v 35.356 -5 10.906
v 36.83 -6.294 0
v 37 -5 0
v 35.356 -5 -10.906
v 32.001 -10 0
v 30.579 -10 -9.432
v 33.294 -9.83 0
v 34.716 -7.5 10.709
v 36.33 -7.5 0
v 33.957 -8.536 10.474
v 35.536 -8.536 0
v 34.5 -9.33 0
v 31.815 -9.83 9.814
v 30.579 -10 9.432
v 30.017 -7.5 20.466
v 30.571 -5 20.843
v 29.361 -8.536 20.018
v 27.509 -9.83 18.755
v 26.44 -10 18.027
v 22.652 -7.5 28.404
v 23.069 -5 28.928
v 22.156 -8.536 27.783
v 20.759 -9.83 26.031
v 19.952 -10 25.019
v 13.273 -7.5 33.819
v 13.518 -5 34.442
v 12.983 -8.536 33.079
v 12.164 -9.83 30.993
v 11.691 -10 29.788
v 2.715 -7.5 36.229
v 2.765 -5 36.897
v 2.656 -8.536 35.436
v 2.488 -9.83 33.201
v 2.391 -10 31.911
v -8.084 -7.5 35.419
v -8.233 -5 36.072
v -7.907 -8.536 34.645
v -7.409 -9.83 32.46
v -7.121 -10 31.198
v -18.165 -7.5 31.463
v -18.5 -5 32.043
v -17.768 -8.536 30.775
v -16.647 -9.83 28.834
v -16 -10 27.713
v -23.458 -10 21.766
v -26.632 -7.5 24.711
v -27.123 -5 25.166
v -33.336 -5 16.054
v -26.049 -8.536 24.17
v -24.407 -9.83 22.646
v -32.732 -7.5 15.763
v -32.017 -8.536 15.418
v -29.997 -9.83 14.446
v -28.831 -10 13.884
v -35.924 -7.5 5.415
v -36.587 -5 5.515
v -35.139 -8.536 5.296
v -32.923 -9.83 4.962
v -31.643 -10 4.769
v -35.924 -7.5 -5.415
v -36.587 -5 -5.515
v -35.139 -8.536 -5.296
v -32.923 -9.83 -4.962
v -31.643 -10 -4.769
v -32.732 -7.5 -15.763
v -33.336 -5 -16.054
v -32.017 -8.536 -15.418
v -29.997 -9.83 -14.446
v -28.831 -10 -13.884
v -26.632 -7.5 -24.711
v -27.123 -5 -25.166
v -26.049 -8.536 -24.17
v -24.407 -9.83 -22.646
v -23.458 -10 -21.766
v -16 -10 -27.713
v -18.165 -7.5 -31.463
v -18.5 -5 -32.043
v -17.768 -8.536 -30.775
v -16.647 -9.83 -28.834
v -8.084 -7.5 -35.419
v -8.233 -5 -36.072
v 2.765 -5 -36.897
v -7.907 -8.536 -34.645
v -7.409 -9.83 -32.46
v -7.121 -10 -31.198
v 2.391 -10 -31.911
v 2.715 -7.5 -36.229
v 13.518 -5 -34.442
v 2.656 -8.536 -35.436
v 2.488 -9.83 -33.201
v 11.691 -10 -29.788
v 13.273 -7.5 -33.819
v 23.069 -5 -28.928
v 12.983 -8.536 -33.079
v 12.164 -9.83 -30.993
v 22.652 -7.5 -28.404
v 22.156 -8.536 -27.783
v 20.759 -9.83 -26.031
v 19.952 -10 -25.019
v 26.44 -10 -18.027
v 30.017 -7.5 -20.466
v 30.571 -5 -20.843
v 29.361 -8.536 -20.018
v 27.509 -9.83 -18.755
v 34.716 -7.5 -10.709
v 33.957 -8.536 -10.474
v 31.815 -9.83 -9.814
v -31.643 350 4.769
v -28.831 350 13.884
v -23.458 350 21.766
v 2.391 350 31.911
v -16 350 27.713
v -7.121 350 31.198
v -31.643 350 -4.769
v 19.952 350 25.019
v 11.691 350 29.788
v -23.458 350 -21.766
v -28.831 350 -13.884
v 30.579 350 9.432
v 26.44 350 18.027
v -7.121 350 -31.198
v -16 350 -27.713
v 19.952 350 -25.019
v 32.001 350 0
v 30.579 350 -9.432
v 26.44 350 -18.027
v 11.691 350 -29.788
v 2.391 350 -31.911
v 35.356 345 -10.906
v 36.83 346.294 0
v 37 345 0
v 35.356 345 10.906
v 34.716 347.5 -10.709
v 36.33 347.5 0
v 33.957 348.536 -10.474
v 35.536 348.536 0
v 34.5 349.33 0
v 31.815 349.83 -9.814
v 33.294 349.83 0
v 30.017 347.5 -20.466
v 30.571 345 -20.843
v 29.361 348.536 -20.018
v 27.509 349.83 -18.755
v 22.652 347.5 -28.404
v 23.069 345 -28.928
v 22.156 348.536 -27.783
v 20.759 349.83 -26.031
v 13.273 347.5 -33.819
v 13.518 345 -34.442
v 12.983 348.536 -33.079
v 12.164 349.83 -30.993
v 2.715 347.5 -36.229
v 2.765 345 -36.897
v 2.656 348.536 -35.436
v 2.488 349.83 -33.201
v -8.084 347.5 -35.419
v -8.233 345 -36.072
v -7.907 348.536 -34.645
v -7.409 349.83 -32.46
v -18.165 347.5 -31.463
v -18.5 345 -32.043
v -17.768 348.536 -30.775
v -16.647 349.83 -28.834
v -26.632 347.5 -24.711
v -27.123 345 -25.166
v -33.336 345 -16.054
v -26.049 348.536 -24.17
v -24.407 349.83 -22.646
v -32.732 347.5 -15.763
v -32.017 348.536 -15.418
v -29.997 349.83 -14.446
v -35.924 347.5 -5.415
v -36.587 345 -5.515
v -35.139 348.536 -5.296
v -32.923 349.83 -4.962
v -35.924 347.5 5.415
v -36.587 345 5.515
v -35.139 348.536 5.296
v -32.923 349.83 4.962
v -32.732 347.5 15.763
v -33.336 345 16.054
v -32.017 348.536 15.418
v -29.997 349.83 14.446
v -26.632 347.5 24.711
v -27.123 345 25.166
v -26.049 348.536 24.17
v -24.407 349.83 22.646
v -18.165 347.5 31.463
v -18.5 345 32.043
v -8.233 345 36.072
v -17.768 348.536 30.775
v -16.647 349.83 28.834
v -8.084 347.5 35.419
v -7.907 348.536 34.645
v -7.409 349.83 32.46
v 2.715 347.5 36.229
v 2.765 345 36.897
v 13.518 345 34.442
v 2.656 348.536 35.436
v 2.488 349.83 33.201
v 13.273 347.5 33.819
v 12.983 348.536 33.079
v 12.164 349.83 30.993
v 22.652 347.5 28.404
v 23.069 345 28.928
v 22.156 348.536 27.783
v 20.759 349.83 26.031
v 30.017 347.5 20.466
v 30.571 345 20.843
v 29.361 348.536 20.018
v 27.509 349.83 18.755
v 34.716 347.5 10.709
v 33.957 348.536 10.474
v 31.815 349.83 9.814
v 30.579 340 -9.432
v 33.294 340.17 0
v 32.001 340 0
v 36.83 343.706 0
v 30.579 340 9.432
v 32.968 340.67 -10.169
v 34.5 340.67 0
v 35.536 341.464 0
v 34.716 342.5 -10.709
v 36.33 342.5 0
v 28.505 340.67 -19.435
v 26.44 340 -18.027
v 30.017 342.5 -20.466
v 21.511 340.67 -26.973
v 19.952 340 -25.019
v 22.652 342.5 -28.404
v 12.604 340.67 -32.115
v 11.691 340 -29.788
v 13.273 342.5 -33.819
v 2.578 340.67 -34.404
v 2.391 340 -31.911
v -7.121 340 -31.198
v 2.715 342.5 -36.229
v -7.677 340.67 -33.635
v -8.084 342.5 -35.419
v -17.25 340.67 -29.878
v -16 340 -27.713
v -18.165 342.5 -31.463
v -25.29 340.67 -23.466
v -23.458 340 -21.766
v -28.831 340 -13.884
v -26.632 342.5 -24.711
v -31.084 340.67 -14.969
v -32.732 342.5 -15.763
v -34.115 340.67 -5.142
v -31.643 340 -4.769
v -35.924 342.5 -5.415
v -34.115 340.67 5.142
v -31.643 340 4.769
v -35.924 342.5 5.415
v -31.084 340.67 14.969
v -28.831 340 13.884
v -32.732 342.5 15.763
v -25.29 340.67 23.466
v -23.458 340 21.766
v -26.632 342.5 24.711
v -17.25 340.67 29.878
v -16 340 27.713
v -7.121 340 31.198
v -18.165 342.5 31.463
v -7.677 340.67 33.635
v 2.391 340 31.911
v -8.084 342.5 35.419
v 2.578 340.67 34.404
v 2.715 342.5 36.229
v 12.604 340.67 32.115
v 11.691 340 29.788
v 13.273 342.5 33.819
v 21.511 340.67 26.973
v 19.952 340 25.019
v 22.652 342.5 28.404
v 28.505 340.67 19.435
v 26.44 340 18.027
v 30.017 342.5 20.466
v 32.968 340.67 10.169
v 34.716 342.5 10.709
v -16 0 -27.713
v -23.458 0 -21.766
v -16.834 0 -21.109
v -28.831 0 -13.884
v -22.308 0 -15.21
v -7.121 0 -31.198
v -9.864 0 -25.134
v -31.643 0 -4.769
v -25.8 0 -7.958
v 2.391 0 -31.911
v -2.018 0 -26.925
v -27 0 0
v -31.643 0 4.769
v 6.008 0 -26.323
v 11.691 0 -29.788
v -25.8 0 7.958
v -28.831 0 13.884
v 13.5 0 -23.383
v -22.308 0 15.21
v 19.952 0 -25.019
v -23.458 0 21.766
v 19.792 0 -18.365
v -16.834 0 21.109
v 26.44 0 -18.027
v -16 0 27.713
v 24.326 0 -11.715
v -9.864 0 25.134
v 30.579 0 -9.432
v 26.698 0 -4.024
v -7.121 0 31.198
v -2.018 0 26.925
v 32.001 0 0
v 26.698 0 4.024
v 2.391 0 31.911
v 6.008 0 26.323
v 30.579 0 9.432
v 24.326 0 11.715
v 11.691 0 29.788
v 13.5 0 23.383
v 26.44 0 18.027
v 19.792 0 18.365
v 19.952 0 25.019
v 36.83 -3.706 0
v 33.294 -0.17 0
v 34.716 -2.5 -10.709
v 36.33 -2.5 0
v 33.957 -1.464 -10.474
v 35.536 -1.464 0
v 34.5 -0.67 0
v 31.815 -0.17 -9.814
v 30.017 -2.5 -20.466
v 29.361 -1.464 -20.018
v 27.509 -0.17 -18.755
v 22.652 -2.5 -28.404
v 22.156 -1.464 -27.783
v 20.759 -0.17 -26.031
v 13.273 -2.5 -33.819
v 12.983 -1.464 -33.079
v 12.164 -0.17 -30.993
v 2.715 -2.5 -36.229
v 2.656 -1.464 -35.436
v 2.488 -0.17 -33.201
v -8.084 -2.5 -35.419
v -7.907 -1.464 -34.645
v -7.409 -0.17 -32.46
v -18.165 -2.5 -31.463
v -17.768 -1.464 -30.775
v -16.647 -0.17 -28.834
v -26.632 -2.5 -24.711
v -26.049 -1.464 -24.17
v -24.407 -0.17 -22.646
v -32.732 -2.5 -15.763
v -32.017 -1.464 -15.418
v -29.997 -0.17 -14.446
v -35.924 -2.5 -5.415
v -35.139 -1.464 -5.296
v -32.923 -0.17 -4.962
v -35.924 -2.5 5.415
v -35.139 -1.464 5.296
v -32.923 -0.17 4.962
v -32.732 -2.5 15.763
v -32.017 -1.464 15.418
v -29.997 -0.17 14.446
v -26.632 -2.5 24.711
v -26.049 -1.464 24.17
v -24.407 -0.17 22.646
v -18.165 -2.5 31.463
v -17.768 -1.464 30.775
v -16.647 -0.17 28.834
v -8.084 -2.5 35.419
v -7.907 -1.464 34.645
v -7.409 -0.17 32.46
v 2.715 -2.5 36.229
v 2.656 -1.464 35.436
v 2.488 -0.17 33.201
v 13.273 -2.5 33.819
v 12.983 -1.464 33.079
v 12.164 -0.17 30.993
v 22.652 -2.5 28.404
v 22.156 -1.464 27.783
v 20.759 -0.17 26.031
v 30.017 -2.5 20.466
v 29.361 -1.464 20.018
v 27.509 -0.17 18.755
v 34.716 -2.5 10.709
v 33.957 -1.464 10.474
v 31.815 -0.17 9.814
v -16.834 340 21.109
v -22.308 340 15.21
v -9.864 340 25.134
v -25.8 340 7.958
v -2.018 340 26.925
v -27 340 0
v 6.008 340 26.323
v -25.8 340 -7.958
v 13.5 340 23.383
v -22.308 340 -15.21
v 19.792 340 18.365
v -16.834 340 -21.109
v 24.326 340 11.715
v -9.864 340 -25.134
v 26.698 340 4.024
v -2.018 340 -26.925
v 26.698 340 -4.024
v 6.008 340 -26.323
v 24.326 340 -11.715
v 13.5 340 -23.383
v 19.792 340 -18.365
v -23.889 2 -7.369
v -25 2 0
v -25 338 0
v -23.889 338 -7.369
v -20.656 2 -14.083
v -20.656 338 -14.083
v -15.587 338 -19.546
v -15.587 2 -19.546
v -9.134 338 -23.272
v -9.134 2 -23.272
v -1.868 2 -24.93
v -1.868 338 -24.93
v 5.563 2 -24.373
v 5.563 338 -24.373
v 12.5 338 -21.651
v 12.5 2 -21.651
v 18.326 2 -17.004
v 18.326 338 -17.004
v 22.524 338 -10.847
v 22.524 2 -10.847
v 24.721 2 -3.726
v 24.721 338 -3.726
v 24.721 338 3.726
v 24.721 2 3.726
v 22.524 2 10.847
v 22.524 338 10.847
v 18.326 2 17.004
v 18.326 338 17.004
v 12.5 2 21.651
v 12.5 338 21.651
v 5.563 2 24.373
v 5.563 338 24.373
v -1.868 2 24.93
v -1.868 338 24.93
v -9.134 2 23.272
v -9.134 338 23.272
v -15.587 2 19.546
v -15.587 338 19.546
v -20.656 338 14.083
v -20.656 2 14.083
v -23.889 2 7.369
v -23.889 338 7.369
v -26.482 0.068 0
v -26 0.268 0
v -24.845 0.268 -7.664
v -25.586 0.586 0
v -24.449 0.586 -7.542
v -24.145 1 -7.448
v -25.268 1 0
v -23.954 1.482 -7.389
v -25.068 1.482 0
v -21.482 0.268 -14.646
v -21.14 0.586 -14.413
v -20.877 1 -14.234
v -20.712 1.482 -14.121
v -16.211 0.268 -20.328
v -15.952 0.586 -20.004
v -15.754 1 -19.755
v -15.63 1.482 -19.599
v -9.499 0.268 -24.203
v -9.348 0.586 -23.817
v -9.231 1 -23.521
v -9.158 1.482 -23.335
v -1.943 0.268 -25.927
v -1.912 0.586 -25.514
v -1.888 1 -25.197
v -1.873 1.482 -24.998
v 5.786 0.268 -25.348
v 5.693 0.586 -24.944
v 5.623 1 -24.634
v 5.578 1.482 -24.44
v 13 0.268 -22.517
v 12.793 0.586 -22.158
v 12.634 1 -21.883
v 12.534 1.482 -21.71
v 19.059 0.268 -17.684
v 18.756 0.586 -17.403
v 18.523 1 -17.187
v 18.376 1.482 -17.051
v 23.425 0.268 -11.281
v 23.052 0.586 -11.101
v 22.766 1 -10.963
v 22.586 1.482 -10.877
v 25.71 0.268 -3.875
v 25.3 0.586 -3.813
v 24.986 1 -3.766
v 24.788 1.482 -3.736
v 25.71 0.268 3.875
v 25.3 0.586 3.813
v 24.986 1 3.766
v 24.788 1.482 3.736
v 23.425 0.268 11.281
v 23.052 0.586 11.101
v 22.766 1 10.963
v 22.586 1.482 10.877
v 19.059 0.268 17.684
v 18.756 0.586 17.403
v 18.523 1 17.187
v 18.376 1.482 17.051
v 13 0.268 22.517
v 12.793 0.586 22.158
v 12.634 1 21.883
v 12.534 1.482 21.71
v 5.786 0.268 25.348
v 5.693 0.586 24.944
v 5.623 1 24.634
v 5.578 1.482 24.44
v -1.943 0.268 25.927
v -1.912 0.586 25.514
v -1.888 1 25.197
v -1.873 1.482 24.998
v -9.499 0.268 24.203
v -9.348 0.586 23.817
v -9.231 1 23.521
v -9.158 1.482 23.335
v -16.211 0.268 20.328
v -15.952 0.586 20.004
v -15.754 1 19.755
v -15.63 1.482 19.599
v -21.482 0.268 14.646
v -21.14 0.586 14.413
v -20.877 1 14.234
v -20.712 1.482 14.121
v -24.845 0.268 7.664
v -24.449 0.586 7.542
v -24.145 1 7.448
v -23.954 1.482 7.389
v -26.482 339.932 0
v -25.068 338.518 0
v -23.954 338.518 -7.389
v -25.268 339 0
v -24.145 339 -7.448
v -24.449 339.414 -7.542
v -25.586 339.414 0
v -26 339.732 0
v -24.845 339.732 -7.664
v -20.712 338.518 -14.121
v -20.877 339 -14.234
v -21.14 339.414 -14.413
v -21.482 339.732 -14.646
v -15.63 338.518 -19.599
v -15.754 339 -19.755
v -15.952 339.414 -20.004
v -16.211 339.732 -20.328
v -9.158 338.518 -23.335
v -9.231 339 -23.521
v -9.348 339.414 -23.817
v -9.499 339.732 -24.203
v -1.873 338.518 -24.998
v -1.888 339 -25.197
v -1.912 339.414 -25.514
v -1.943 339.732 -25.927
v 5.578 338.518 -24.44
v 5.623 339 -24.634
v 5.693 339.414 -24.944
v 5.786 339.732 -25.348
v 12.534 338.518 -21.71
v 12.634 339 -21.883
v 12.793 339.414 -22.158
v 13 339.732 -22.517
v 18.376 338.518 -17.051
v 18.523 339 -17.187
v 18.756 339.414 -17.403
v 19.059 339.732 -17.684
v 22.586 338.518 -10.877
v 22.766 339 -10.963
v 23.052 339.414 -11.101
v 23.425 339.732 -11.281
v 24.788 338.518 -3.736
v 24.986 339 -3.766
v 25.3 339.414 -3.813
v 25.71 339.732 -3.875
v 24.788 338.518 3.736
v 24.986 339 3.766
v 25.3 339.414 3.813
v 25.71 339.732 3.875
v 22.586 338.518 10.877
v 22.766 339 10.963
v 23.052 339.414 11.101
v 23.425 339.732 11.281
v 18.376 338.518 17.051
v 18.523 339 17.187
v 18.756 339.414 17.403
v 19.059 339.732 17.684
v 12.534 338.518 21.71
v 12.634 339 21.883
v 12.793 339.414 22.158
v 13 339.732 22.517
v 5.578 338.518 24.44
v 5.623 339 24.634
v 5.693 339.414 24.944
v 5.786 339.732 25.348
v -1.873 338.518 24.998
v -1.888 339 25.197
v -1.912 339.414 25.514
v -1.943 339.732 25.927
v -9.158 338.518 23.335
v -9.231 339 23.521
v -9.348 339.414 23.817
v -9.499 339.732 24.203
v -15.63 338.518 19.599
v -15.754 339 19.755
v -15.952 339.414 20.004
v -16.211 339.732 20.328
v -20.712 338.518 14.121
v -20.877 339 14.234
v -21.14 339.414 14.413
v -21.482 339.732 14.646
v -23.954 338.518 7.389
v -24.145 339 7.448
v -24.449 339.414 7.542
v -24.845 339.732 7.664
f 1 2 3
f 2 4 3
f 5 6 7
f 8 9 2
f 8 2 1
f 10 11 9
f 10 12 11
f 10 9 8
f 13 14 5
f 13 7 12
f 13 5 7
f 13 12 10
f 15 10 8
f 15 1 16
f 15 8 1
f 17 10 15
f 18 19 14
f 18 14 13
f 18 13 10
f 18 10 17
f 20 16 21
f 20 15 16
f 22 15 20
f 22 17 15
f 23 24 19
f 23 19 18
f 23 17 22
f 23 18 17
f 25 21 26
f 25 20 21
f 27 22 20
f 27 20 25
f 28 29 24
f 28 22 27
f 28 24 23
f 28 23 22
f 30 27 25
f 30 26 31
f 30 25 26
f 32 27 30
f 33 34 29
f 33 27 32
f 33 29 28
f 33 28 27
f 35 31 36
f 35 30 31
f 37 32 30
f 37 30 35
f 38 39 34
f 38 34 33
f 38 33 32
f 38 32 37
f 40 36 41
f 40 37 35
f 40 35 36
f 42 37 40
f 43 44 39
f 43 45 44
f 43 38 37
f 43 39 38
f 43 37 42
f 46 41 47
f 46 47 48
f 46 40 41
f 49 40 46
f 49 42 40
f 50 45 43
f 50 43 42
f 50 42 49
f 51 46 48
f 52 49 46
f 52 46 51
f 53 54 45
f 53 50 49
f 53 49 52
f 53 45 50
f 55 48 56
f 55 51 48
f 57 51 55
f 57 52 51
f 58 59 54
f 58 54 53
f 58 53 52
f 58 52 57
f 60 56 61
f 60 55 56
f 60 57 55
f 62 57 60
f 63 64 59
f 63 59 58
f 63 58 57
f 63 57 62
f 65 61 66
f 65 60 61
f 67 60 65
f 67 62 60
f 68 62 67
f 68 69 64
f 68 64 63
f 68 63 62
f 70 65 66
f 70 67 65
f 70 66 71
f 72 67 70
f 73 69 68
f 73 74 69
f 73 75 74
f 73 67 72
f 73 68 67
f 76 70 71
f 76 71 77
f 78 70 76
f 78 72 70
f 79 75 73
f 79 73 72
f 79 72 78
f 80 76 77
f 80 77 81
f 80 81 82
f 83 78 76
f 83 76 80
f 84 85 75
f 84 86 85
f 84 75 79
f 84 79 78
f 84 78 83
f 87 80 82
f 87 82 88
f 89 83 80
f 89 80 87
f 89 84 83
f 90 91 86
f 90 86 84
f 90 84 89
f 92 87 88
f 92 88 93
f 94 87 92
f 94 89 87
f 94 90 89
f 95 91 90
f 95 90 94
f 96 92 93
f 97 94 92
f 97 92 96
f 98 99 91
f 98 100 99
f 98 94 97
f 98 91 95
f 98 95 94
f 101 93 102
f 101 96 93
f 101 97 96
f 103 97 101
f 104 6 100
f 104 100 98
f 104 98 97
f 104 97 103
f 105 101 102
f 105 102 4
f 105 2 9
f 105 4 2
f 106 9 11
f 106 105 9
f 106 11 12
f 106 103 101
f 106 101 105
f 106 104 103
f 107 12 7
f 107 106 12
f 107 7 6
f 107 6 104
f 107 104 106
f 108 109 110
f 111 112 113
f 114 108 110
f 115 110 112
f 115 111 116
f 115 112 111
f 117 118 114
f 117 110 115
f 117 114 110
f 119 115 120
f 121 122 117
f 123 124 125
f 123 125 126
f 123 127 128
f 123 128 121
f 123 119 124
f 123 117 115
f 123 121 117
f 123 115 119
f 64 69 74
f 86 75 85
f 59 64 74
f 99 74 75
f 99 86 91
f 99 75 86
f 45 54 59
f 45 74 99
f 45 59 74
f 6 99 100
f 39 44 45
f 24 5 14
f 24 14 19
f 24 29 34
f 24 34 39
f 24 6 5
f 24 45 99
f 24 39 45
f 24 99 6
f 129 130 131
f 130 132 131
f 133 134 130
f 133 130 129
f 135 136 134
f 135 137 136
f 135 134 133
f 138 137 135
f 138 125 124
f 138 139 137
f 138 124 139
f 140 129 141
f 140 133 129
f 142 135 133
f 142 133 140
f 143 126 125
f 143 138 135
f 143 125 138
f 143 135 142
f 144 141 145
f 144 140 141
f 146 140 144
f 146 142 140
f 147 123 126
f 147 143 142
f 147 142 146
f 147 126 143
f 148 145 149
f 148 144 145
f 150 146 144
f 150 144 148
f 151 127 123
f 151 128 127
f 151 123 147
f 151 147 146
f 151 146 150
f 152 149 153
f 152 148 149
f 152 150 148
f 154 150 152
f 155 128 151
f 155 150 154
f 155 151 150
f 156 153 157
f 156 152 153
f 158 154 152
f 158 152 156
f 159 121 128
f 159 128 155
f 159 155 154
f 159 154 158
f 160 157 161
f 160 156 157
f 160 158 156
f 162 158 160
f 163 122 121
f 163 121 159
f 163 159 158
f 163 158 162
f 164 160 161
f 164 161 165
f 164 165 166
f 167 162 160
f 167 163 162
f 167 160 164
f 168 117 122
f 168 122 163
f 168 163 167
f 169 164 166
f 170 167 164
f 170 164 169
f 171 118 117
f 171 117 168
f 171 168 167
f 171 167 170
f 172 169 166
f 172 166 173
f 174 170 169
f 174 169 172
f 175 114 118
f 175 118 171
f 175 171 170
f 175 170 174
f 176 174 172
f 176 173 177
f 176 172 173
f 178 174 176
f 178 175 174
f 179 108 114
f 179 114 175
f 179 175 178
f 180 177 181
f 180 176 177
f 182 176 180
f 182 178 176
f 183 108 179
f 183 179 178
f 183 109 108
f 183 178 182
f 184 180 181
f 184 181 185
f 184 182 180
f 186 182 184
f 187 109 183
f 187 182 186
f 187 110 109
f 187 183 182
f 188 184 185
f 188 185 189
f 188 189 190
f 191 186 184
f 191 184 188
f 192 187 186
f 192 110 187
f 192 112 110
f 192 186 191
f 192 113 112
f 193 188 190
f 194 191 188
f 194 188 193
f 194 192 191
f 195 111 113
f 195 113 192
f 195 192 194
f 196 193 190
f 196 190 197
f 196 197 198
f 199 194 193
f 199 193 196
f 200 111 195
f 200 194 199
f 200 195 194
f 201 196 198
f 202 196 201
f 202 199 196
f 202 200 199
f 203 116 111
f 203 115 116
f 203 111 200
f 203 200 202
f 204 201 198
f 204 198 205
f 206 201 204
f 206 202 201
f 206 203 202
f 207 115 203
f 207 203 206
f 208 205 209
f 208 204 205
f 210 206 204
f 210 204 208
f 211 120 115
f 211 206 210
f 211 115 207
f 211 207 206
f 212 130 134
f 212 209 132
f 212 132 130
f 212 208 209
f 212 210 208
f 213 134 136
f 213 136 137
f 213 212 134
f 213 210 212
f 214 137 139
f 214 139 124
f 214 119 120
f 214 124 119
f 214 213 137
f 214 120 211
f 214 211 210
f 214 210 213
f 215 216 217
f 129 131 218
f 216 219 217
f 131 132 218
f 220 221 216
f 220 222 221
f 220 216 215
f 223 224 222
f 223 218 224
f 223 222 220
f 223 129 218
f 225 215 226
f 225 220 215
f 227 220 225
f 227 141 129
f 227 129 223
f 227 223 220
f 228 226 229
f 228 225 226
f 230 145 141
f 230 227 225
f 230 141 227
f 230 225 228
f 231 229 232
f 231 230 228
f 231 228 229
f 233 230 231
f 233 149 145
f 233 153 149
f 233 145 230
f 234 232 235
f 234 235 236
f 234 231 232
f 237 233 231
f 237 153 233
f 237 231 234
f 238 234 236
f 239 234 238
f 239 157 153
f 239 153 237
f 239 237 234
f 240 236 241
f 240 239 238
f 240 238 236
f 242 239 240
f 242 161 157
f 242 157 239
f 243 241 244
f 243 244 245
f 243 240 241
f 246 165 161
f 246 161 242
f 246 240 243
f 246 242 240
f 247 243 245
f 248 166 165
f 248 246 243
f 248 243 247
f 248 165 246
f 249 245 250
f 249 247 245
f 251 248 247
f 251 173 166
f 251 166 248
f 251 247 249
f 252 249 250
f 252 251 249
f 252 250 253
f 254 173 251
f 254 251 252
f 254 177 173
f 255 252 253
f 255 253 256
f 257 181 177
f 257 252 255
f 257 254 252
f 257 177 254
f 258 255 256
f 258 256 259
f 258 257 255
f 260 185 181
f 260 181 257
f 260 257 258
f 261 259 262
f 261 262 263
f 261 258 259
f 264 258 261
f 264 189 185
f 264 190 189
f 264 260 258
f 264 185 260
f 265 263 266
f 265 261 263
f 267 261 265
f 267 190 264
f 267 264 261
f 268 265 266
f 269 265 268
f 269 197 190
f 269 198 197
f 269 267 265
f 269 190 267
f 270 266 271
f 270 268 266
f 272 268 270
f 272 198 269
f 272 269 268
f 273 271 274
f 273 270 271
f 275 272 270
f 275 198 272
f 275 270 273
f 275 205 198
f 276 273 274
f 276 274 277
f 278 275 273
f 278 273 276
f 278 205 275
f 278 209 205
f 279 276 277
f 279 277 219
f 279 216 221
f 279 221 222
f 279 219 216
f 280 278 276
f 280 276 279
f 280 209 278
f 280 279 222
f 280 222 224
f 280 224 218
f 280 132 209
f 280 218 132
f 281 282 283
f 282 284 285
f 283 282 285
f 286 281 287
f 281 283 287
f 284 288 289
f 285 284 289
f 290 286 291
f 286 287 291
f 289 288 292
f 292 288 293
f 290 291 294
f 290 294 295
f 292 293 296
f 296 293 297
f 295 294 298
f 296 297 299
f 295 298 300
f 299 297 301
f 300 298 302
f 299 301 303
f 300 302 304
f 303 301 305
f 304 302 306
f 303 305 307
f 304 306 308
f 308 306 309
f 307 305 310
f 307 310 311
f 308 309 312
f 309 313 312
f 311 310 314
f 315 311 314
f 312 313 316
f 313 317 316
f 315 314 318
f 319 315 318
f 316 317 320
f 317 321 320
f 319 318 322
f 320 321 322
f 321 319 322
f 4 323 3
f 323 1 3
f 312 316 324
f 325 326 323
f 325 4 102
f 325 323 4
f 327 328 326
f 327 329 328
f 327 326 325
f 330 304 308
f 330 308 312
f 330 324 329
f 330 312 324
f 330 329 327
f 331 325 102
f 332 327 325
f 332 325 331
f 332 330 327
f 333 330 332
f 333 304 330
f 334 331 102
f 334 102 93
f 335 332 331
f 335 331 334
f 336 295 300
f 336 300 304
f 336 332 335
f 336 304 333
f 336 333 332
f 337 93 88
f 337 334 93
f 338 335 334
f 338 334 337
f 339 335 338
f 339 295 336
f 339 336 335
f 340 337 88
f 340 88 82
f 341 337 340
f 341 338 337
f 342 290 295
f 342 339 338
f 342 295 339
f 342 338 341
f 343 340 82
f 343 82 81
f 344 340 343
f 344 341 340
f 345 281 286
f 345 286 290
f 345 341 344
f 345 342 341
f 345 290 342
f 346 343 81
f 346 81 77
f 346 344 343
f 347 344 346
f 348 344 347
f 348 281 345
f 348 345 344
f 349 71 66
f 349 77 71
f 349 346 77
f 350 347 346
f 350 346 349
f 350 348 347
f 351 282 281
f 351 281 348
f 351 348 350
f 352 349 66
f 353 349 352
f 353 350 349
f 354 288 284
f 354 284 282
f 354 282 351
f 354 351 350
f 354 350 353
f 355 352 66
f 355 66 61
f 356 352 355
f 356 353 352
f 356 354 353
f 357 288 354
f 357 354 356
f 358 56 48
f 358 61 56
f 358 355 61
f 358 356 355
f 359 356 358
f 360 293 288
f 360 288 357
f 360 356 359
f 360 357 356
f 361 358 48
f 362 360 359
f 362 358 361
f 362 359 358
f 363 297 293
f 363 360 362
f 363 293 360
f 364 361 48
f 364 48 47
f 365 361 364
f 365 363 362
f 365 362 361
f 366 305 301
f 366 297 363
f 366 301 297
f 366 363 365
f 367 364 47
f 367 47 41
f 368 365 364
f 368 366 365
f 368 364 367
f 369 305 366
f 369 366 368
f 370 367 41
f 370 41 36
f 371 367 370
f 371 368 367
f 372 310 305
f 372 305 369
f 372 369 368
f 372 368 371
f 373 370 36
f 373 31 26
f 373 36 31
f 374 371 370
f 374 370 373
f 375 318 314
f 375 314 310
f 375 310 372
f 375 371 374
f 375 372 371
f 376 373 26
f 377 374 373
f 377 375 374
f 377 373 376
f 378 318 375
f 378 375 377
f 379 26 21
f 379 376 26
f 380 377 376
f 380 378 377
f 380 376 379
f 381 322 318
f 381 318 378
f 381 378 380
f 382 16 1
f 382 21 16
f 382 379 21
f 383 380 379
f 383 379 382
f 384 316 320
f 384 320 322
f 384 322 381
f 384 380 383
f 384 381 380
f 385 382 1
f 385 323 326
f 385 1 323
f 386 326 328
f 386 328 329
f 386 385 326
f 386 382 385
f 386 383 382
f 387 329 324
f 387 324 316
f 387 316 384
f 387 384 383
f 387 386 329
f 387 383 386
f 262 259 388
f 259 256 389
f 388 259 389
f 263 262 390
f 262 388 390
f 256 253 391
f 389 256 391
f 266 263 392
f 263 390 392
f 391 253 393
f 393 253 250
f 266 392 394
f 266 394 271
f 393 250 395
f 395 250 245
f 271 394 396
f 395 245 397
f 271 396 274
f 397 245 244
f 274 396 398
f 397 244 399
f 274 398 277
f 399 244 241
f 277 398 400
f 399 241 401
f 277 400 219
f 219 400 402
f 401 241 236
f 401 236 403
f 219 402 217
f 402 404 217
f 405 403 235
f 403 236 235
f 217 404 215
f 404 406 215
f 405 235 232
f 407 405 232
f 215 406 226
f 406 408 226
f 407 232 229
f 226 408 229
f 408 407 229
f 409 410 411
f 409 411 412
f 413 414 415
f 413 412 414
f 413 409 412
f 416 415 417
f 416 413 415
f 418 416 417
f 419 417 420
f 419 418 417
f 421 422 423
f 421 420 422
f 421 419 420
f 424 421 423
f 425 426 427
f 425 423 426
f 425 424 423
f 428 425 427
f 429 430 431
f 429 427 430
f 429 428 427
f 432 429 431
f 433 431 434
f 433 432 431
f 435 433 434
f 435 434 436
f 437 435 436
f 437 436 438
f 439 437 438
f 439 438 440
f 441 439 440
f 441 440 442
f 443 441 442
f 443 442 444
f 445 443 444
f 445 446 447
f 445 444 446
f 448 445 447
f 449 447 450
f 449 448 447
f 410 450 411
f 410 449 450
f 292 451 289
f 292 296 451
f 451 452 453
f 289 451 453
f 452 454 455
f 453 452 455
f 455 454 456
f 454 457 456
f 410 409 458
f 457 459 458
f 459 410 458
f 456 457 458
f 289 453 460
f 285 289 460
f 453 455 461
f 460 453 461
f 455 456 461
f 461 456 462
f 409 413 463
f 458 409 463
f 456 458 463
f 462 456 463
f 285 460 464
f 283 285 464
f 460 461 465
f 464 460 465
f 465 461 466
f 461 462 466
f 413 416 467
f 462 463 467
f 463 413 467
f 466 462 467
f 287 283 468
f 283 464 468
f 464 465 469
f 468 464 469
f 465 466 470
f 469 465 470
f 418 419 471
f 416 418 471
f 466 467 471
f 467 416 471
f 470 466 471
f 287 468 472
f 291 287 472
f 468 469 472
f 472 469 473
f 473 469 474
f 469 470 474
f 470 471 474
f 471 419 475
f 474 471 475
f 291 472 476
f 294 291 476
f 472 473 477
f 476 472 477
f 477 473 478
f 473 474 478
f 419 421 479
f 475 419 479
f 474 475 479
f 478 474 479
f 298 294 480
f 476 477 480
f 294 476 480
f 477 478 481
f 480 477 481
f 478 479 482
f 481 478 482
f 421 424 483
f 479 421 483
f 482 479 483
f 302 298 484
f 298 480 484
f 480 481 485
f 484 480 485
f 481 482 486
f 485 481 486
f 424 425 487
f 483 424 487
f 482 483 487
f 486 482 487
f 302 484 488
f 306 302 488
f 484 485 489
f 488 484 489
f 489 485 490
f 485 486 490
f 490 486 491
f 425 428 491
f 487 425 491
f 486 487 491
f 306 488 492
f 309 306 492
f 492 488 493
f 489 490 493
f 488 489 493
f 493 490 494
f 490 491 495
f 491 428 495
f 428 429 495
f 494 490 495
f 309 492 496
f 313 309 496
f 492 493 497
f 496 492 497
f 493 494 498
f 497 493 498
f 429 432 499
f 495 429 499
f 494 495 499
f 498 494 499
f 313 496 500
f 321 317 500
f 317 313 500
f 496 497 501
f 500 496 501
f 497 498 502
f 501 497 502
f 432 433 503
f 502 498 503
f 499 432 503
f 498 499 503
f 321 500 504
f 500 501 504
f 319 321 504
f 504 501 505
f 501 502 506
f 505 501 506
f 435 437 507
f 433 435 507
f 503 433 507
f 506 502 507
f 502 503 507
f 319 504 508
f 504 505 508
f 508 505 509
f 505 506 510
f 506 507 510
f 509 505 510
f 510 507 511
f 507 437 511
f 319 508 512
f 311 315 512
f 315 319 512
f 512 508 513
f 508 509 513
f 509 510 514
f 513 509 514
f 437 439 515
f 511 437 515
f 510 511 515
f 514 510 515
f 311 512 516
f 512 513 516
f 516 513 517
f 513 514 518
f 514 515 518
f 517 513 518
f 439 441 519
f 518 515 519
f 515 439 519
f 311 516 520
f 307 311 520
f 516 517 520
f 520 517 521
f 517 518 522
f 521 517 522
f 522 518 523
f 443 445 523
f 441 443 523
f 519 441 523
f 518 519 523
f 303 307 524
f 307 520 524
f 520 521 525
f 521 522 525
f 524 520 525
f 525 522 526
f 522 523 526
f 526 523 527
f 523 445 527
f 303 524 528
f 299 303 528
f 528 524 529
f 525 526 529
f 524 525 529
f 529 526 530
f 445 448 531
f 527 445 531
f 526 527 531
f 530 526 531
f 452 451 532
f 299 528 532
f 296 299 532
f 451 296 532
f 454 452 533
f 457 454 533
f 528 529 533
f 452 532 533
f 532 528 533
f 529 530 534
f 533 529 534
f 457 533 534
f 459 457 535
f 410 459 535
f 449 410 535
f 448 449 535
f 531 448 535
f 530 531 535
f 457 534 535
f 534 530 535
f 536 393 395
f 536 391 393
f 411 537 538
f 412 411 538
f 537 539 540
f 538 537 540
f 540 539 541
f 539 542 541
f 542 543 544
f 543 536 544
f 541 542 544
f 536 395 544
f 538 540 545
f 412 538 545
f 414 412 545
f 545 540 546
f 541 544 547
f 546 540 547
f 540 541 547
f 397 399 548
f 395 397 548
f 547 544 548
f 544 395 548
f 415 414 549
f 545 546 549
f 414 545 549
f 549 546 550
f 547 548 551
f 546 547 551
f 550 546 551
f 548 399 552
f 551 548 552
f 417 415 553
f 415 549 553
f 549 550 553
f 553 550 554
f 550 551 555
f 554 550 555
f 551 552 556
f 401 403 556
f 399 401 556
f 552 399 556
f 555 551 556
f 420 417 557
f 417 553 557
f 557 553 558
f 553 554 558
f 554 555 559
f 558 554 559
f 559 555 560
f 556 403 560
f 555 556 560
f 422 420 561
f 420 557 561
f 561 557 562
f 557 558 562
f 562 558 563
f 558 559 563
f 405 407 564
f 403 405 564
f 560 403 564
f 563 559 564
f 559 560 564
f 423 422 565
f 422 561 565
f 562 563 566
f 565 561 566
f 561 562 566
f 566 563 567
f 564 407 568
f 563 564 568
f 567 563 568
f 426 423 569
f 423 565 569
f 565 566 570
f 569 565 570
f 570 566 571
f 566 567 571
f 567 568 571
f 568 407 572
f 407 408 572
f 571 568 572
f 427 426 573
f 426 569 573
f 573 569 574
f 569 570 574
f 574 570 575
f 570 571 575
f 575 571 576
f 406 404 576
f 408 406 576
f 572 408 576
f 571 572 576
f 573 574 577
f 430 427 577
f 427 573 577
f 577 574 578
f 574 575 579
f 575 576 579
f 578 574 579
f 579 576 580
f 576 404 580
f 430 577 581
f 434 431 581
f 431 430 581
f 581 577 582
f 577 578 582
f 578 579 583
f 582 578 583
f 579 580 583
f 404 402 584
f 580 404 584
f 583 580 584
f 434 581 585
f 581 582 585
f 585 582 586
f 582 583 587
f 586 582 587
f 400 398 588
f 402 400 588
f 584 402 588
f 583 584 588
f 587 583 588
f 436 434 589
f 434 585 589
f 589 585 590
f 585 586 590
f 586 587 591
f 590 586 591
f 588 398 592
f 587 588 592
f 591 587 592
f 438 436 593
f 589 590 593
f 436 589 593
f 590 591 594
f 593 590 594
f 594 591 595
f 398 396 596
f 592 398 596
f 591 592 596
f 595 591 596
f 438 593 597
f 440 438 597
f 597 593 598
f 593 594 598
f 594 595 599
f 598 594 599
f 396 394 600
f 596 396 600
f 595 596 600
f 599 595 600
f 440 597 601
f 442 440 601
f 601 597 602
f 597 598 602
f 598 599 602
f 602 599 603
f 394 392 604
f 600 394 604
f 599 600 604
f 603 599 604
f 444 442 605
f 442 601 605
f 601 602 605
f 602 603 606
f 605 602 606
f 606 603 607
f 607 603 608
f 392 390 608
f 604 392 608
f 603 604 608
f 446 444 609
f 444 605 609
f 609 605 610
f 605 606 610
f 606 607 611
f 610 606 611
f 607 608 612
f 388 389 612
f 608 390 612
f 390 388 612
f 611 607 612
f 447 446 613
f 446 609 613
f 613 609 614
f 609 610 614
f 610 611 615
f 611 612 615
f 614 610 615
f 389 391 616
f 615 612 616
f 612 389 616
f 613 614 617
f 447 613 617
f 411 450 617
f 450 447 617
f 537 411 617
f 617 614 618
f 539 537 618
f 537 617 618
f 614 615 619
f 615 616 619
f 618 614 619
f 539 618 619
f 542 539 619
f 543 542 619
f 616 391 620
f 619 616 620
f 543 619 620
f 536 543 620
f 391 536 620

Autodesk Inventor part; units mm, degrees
ref_plane "YZ Plane" through (0, 0, 0) normal (1, 0, 0) x (0, 1, 0)
ref_plane "XZ Plane" through (0, 0, 0) normal (0, 1, 0) x (-1, 0, 0)
ref_plane "XY Plane" through (0, 0, 0) normal (0, 0, 1) x (1, 0, 0)
sketch "草图1" plane through (0, 0, 0) normal (0, 1, 0) x (-1, 0, 0)
  circle A0 centre (0, 0) radius 25
  dimension "d0" = 50
extrude "拉伸1" add sketch "草图1" along normal blind 340
sketch "草图2" plane through (0, 340, 0) normal (0, 1, 0) x (1, 0, 0)
  circle A0 centre (0, 0) radius 37
extrude "拉伸2" add sketch "草图2" along normal blind 10
sketch "草图3" plane through (0, 0, 0) normal (0, -1, 0) x (1, 0, 0)
  circle A0 centre (0, 0) radius 37
extrude "拉伸3" add sketch "草图3" along normal blind 10
fillet "圆角1" radius 5 4 edges at (-37, 350, 0) (-37, 340, 0) (-37, 0, 0) (-37, -10, 0)
fillet "圆角2" radius 2 2 edges at (25, 340, 0) (25, 0, 0)
properties part number "销钉" material "钢，高强度，低合金"
